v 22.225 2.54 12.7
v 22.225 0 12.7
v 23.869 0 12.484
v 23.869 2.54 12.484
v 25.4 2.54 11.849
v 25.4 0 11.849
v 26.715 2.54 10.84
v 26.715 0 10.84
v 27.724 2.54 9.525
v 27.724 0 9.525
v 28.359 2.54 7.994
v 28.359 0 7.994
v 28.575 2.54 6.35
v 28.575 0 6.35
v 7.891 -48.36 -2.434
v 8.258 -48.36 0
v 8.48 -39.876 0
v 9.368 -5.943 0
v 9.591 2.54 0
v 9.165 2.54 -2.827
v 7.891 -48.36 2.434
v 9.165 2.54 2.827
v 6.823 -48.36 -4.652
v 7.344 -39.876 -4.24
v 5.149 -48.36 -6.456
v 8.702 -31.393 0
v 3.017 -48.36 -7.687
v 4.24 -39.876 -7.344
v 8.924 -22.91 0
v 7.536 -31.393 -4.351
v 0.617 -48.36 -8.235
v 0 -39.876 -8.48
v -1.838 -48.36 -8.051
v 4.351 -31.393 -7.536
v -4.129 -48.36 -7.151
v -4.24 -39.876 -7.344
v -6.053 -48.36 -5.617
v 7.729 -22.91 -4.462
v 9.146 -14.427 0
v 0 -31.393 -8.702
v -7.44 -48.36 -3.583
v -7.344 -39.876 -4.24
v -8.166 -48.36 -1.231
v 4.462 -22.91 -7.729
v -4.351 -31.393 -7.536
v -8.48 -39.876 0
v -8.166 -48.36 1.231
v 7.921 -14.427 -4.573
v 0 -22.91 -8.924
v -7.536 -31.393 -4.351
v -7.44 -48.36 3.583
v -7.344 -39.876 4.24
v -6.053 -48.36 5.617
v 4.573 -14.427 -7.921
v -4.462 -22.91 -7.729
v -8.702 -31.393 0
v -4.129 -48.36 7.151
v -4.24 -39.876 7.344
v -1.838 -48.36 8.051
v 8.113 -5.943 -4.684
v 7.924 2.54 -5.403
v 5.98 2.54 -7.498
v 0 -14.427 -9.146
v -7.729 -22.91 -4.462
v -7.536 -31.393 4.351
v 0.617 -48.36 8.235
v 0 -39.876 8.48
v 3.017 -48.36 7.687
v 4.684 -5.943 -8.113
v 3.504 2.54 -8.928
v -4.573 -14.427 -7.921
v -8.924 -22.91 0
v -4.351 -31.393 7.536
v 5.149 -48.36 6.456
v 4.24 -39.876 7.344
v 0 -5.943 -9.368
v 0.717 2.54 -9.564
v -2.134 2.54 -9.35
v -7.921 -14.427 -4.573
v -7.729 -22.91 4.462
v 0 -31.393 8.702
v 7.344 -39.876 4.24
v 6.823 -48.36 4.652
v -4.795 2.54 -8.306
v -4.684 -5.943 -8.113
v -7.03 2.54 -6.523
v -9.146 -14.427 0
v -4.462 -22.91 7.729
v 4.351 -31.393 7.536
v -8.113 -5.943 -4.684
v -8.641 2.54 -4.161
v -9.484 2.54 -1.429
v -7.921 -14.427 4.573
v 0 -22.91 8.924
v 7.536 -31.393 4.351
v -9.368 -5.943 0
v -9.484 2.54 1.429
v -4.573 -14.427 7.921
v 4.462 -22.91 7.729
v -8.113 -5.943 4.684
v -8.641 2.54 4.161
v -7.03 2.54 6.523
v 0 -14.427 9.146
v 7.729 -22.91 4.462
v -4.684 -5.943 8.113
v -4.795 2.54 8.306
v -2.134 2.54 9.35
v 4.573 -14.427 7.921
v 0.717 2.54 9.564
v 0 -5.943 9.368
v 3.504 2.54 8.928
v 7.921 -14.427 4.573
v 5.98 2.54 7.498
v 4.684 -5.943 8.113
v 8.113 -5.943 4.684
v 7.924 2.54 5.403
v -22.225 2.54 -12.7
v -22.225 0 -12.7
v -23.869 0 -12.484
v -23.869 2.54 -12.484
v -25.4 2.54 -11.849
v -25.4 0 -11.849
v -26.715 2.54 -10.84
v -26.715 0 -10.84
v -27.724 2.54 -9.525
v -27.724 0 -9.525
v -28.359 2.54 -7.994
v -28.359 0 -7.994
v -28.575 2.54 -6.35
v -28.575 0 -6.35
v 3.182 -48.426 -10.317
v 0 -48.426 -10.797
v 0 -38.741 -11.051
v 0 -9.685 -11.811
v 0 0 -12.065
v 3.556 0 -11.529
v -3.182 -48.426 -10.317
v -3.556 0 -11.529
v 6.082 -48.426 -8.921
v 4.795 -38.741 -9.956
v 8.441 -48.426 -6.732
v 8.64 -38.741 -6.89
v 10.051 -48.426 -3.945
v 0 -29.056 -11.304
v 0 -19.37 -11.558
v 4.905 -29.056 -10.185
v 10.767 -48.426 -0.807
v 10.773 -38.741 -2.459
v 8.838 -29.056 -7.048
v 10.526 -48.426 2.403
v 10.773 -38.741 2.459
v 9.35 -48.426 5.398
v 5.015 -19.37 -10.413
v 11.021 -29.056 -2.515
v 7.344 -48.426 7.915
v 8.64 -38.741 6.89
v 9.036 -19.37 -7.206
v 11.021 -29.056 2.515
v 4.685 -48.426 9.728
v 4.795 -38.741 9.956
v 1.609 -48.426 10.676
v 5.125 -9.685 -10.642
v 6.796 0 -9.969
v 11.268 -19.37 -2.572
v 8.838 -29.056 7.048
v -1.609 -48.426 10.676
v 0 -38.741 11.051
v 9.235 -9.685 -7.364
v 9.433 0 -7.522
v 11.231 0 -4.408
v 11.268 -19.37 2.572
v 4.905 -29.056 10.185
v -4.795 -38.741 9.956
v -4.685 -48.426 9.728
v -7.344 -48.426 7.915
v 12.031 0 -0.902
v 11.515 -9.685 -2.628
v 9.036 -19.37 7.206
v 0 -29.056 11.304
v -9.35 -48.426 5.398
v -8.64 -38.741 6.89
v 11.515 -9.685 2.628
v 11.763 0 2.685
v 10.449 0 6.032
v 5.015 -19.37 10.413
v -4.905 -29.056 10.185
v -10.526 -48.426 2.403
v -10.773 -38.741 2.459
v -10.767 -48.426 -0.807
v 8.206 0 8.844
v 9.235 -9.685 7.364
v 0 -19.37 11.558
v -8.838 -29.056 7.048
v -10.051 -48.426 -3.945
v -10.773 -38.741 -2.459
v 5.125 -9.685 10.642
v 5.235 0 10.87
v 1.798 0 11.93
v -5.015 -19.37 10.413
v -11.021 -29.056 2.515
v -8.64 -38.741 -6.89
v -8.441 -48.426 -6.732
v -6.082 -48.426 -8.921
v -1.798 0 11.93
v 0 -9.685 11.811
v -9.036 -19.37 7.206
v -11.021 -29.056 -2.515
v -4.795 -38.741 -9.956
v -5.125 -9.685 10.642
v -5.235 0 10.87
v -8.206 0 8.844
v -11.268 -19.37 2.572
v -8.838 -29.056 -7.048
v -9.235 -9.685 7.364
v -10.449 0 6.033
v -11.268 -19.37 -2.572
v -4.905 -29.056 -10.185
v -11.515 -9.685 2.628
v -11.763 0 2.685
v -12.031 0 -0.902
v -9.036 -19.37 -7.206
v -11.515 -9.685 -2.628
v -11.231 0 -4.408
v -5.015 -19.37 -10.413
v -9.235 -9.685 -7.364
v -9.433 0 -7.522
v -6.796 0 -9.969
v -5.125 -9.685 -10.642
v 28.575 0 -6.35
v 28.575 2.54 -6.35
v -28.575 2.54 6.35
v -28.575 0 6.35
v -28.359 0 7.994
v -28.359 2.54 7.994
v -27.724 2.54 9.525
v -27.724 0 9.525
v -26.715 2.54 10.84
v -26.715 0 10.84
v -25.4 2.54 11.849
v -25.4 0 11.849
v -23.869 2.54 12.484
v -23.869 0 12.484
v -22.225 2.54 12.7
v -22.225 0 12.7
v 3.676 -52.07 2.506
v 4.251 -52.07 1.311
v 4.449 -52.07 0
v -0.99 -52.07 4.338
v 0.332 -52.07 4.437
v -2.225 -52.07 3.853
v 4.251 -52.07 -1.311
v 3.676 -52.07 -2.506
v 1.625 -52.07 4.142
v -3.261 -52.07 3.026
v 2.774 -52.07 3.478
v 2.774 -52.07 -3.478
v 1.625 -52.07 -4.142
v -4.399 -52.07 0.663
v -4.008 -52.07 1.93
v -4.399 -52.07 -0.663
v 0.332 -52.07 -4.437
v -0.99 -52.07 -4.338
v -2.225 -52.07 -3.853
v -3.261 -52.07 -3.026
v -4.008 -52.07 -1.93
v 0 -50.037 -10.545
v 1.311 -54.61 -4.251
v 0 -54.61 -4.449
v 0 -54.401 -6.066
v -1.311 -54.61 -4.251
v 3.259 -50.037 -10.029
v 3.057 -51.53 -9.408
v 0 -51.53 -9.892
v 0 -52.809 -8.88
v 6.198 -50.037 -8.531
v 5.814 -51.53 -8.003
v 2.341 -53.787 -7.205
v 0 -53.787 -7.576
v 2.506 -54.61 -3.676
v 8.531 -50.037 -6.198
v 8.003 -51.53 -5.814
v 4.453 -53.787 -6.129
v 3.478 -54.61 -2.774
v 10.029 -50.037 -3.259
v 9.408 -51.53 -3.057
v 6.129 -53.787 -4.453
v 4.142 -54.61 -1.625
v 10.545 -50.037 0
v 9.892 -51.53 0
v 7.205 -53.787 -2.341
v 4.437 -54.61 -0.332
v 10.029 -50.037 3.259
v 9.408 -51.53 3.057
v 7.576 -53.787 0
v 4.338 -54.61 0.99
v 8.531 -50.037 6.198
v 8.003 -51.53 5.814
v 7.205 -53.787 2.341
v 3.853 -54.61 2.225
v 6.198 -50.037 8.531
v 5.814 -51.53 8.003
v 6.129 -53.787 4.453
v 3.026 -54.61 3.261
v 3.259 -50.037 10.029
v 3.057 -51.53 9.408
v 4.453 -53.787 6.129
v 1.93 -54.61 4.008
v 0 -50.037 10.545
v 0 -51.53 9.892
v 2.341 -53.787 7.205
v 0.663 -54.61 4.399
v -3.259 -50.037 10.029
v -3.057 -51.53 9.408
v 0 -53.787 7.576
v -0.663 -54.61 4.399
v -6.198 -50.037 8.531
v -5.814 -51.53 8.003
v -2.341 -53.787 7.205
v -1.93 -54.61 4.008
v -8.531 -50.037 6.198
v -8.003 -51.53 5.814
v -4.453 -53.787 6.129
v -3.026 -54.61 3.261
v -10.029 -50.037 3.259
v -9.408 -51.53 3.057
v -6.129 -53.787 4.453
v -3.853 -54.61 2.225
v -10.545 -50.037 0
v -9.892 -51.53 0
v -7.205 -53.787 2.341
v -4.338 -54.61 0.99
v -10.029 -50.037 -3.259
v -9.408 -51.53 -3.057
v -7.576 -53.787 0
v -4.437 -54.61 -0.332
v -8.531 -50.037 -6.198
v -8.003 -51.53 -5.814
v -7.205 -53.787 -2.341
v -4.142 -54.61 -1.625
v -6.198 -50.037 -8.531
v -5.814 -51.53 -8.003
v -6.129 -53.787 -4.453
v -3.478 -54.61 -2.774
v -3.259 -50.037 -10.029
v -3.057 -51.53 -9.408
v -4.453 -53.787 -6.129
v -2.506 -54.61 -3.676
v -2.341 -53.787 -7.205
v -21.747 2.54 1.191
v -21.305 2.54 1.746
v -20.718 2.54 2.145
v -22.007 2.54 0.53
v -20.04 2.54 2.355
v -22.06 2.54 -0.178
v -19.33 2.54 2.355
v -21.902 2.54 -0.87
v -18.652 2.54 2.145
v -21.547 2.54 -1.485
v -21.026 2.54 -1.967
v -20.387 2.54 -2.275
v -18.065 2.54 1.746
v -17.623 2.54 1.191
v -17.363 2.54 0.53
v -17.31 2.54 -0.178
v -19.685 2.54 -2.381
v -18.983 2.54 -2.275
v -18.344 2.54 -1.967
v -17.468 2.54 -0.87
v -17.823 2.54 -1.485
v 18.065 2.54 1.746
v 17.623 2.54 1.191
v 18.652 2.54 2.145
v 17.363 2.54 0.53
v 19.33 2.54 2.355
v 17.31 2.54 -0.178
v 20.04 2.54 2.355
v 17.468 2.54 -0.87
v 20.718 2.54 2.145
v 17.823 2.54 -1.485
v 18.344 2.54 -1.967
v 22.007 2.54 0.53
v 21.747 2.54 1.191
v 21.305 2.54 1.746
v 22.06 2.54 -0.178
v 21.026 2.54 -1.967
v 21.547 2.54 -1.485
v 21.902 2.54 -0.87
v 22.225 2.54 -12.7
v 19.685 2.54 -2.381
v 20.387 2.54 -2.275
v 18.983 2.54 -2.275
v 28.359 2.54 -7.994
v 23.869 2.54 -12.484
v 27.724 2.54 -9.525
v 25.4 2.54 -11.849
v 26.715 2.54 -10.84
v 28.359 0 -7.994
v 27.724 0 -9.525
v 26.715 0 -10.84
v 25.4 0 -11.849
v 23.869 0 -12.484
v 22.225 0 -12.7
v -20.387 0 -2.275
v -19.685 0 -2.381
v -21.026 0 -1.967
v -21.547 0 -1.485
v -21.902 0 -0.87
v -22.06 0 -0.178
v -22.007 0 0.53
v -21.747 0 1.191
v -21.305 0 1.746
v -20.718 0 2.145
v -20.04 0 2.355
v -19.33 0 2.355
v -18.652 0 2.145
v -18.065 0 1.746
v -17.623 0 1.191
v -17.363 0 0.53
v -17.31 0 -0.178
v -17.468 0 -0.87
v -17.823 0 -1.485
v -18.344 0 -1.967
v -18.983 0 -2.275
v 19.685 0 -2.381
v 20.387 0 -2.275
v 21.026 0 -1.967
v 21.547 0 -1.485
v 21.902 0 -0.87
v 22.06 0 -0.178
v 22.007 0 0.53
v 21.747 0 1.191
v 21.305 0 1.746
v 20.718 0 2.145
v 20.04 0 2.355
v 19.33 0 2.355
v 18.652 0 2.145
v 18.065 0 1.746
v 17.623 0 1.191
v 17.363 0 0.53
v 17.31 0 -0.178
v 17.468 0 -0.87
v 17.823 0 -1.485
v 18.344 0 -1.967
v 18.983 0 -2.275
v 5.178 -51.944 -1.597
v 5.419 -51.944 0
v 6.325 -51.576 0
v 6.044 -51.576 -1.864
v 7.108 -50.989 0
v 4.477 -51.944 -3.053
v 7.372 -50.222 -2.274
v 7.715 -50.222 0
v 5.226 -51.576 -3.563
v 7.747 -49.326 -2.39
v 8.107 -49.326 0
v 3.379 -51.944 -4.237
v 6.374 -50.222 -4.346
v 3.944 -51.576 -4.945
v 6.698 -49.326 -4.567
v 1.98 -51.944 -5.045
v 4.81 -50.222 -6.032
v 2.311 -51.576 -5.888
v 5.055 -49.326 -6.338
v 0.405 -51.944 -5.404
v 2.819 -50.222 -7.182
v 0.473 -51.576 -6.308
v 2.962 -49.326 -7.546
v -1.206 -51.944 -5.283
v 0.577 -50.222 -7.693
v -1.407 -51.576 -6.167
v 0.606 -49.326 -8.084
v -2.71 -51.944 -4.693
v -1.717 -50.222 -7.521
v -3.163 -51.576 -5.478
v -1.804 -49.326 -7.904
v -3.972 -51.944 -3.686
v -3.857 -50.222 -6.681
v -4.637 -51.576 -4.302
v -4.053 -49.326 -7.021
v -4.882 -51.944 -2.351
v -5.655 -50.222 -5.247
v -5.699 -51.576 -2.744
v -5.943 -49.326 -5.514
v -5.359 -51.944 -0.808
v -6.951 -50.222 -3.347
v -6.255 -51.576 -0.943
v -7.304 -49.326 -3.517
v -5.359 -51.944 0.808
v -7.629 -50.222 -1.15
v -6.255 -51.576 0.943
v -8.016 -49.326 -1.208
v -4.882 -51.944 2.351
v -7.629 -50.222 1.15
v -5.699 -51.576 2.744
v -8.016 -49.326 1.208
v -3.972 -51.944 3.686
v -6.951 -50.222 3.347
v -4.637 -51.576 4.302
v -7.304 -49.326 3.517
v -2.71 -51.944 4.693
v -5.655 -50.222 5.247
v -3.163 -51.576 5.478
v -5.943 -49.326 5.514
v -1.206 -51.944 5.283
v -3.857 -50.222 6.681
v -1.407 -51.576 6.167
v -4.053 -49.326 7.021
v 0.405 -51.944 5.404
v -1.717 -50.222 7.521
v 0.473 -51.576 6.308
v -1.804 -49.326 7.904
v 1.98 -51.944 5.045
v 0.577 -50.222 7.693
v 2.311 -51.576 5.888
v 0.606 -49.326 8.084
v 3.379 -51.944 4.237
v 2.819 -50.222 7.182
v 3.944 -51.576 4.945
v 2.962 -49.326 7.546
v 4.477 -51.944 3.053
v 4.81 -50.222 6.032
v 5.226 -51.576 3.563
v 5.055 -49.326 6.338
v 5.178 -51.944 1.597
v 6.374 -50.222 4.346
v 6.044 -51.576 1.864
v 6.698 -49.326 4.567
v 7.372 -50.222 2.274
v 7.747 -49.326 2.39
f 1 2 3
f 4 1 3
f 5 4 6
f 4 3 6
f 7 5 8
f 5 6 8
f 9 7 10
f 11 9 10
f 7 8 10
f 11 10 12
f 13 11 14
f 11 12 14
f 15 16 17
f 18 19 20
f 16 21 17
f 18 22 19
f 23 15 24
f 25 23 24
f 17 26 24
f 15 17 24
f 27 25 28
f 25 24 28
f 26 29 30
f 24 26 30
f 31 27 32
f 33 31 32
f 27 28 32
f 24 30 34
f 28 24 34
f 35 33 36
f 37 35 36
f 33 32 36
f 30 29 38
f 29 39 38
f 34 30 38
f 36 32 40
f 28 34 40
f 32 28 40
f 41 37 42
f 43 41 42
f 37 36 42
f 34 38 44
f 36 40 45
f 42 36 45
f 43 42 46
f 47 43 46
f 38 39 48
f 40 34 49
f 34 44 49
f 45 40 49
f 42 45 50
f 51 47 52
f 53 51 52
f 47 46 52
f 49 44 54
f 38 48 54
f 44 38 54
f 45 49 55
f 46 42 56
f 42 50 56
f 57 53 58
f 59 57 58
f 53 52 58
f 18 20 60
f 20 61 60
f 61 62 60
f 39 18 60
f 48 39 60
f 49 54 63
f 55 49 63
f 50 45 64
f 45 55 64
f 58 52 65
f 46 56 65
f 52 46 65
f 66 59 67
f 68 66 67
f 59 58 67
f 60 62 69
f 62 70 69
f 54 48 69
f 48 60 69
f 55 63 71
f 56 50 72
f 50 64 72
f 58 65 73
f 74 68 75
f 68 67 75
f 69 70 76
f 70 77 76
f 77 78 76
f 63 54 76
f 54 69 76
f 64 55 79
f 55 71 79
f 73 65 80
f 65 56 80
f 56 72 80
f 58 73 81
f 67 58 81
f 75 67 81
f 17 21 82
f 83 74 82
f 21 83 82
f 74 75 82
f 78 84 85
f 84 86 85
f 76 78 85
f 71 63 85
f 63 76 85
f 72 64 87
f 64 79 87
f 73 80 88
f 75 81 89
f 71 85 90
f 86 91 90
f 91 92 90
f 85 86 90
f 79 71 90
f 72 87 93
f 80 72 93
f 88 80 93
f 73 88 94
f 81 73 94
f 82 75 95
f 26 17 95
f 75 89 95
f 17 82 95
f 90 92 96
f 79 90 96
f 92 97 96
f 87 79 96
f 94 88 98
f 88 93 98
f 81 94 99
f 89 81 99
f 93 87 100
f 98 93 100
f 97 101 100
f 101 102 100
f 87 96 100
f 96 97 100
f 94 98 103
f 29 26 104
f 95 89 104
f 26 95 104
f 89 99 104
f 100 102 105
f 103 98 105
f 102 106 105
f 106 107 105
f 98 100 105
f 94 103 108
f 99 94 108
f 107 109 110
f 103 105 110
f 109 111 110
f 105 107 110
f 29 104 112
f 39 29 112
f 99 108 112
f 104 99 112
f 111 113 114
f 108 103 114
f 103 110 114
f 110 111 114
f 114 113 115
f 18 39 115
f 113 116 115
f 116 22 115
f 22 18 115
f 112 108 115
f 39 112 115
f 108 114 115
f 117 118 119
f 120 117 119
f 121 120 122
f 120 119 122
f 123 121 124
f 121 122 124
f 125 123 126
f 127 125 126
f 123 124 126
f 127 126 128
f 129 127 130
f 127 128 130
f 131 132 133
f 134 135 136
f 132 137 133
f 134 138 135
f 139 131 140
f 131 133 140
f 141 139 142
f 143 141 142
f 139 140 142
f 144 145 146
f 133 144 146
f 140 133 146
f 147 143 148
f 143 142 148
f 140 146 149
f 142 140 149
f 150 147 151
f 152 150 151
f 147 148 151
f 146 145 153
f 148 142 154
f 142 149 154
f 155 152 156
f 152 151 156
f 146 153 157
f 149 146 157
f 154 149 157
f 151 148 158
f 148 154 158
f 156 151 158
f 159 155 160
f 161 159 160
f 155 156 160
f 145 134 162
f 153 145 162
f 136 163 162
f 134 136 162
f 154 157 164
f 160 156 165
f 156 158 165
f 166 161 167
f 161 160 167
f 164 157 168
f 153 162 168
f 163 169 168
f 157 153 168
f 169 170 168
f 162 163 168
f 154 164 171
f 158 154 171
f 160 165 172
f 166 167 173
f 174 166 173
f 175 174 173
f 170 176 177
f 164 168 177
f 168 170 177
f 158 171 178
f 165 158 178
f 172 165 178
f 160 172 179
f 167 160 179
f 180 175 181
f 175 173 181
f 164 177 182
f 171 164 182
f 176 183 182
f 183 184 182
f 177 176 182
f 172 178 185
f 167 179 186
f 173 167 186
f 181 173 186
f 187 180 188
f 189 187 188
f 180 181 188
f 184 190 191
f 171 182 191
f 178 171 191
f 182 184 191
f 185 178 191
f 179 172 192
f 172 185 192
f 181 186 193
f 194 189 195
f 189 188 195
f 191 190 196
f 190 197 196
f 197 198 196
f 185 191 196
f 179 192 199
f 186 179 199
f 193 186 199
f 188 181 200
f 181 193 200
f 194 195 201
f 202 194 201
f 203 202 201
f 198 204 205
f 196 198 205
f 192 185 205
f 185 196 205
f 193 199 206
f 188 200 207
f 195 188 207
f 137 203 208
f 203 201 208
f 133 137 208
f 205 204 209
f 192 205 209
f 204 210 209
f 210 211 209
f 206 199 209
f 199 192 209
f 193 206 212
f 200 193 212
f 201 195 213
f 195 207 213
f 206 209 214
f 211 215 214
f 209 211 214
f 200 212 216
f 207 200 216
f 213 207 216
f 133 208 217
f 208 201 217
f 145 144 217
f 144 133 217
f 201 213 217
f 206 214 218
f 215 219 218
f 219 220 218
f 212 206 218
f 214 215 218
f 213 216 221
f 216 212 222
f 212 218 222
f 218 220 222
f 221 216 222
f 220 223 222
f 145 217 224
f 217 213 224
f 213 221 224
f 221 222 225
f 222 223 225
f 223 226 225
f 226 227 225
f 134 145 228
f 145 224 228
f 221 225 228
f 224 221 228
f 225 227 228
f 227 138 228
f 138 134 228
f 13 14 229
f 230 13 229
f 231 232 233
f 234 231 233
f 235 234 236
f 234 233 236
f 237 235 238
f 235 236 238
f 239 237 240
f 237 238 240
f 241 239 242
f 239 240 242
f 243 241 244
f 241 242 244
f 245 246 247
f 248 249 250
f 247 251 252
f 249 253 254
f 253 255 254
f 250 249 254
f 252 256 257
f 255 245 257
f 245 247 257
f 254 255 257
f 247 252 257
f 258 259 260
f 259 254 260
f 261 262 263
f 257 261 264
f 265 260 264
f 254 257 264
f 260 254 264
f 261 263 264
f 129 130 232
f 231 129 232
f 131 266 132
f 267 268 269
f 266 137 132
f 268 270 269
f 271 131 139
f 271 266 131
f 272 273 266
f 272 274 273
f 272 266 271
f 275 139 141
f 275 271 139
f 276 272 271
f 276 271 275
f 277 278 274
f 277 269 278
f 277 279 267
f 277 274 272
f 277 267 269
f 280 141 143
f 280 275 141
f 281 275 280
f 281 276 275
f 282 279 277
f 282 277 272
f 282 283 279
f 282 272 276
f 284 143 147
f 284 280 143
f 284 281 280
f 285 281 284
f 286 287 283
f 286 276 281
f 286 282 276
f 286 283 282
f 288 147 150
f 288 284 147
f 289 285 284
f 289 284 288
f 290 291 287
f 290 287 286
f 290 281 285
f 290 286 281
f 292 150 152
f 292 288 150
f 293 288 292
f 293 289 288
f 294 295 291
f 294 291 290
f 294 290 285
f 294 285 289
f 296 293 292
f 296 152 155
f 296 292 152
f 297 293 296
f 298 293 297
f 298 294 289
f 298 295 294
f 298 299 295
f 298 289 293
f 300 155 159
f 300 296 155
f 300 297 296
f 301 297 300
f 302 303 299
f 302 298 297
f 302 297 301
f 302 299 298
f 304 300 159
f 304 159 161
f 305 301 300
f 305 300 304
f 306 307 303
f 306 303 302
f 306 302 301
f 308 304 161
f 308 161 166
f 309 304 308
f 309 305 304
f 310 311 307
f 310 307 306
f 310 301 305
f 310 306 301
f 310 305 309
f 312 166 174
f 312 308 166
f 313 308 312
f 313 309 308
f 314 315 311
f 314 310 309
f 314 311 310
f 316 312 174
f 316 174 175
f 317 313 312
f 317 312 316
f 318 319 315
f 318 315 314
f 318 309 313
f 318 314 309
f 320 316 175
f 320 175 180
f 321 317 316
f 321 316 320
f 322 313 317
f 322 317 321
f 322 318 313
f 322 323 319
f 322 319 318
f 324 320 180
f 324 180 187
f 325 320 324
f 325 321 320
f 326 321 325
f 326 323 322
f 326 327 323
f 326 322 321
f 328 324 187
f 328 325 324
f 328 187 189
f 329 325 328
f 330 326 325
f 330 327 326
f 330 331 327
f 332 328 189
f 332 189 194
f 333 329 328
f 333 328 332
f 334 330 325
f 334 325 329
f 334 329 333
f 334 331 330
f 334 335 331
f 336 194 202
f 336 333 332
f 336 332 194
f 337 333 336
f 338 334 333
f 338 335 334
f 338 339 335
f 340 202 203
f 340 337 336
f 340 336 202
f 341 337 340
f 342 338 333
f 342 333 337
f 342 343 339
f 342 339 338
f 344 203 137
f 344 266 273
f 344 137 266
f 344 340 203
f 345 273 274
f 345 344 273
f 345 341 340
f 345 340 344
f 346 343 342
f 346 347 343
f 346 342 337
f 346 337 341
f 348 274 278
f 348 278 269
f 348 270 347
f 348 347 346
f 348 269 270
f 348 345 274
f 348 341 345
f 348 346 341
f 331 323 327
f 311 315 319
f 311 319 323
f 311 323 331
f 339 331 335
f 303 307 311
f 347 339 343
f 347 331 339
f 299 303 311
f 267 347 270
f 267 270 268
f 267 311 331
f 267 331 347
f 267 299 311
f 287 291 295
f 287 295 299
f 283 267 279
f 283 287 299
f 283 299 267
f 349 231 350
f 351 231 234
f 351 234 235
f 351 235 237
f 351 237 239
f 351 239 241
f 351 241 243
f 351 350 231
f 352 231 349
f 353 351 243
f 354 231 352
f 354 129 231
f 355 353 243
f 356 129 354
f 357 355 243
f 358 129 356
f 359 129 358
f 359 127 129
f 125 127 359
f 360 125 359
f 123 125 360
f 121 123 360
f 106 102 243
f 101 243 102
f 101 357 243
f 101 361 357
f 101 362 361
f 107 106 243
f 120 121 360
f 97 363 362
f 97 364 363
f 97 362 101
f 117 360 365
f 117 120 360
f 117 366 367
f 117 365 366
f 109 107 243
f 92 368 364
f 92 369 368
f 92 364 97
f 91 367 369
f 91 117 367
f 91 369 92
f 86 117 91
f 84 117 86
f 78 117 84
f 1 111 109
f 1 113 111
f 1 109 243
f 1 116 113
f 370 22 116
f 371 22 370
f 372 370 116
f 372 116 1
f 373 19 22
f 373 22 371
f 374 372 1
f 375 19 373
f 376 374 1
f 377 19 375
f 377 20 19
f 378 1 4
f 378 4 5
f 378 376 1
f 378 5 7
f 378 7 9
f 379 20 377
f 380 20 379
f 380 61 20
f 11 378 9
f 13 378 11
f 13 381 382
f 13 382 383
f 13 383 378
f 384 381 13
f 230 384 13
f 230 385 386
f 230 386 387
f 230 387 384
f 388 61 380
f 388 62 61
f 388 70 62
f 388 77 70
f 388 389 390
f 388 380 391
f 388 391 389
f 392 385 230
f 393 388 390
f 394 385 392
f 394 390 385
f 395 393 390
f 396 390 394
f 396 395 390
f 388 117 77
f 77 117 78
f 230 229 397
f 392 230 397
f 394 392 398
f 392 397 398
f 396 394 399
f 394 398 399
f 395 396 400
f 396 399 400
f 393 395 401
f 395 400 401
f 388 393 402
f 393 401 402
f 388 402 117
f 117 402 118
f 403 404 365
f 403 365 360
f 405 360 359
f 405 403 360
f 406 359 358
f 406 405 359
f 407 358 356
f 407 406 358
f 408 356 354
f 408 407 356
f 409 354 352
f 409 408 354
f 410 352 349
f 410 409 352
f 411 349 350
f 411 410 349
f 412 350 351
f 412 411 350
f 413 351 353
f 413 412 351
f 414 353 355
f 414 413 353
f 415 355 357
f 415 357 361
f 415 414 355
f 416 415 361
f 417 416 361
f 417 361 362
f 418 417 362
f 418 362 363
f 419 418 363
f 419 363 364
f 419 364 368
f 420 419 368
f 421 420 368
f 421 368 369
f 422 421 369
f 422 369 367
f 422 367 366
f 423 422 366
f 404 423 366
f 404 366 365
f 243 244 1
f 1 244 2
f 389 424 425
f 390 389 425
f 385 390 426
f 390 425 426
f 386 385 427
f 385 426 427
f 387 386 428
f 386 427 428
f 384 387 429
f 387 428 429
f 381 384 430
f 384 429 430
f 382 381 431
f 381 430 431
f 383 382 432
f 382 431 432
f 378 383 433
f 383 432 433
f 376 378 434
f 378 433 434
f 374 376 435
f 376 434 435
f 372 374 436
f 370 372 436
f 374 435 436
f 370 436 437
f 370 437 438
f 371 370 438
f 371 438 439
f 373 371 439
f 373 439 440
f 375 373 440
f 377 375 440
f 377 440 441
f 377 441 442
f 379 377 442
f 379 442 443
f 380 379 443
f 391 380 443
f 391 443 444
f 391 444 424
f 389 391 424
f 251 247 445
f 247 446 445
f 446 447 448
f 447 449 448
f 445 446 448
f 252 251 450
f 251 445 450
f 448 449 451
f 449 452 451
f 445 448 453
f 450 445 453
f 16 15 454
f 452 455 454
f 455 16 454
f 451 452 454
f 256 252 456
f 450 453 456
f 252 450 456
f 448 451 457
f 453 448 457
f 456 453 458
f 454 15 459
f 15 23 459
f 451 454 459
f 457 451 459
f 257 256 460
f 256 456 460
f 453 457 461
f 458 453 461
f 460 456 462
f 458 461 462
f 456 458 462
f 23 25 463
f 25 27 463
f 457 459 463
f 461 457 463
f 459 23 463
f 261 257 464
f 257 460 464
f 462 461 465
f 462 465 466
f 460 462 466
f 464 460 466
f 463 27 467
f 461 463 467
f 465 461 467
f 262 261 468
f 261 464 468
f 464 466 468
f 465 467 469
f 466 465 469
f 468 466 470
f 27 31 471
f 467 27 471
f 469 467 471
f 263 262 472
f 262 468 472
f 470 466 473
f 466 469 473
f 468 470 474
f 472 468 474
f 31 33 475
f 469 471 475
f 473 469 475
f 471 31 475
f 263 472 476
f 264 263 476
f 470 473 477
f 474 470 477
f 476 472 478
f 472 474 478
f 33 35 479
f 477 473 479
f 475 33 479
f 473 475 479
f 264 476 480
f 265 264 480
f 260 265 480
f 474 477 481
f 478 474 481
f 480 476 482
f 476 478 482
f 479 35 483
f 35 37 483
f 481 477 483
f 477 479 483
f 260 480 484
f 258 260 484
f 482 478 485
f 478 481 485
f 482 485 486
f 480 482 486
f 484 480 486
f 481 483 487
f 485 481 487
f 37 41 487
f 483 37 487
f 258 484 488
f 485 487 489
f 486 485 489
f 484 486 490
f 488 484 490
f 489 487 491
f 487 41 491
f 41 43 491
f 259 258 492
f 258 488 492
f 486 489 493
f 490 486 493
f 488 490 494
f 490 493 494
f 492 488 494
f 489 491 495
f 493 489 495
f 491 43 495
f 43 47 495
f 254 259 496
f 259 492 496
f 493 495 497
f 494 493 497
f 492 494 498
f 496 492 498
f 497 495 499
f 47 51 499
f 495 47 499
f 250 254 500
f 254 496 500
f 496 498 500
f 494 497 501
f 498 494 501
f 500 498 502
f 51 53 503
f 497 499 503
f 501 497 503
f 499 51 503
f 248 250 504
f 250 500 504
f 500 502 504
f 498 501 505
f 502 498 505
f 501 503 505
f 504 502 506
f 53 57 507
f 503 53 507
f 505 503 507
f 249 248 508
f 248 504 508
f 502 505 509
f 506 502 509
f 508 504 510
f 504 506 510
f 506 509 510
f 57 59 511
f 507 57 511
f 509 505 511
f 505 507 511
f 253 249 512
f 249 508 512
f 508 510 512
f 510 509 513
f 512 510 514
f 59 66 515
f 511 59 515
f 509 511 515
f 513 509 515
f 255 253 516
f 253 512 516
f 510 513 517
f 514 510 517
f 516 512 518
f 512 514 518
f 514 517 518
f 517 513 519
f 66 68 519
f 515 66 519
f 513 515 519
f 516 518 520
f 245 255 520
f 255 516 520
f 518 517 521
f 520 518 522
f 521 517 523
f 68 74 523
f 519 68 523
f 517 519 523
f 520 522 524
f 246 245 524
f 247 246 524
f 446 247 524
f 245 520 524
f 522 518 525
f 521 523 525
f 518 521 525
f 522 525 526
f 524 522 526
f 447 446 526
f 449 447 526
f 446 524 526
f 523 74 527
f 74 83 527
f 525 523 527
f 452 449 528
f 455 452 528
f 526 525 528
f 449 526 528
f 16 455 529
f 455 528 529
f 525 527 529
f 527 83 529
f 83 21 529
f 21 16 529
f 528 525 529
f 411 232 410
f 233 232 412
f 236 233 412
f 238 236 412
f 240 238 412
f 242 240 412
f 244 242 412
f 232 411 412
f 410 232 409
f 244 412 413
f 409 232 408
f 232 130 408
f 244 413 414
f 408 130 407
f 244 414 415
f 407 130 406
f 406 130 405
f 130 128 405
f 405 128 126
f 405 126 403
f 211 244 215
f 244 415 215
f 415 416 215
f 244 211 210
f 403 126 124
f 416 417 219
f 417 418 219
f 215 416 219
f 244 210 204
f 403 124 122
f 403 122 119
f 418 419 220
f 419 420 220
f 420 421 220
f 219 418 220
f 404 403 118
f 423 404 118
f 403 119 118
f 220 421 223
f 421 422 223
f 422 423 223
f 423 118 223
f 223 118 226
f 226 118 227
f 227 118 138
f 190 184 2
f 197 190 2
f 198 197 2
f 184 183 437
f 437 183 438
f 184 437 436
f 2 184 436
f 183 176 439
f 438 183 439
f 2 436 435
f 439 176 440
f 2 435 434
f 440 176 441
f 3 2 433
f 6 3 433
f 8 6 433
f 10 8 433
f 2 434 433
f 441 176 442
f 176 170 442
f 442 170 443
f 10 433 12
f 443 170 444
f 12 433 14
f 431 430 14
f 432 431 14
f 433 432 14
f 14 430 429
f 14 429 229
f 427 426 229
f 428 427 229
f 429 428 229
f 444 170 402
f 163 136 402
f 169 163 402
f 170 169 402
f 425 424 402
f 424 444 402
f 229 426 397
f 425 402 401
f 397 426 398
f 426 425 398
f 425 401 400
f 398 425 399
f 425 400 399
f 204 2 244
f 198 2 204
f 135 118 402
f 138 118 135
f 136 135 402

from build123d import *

# Parameters (mm, degrees)
BOSS_EXTRUDE1_DEPTH = 2.54
SKETCH2_R           = 12.065
BOSS_EXTRUDE2_DEPTH = 54.61
DRAFT2_ANGLE        = 1.5
FILLET2_R           = 6.35
CUT_EXTRUDE1_REACH  = 64.929
SKETCH3_R           = 2.38125


# Read off the part's stored shape, not the designer's step: Shell1
with BuildPart() as part:
    # Sketch1 → Boss-Extrude1 (new body)
    with BuildSketch(Plane(origin=(0, 0, 0), x_dir=(1, 0, 0), z_dir=(0, 1, 0))):
        with BuildLine():
            Line((-22.225, -12.7), (22.225, -12.7))
            ThreePointArc((22.225, -12.7), (26.715128061, -10.840128061), (28.575, -6.35))
            Line((28.575, -6.35), (28.575, 6.35))
            ThreePointArc((28.575, 6.35), (26.715128061, 10.840128061), (22.225, 12.7))
            Line((22.225, 12.7), (-22.225, 12.7))
            ThreePointArc((-22.225, 12.7), (-26.715128061, 10.840128061), (-28.575, 6.35))
            Line((-28.575, 6.35), (-28.575, -6.35))
            ThreePointArc((-28.575, -6.35), (-26.715128061, -10.840128061), (-22.225, -12.7))
        make_face()
    extrude(amount=BOSS_EXTRUDE1_DEPTH)

    # Sketch2 → Boss-Extrude2 (add)
    with BuildSketch(Plane.XZ):
        with Locations(Location((0, 0, 0), (0, 0, 270))):
            Circle(SKETCH2_R)
    extrude(amount=BOSS_EXTRUDE2_DEPTH)

    # Draft2
    draft2_faces = [part.faces().sort_by_distance(p)[0] for p in [
        (0, -27.305, 12.065),
    ]]
    draft(draft2_faces, Plane(origin=(22.225, 0, 6.35), x_dir=(0, 0, -1), z_dir=(0, -1, 0)), DRAFT2_ANGLE)

    # Fillet2
    fillet2_edges = [part.edges().sort_by_distance(p)[0] for p in [
        (0, -54.61, 10.634986823),
    ]]
    fillet(fillet2_edges, radius=FILLET2_R)

    # Shell1 outline → Shell1 (revolve, cut)
    with BuildSketch(Plane.XY):
        with BuildLine():
            ThreePointArc((4.449090693, -52.07), (7.107672345, -50.989110404), (8.257785101, -48.359734173))
            Line((8.257785101, -48.359734173), (9.590641548, 2.54))
            Line((9.590641548, 2.54), (0, 2.54))
            Line((0, 2.54), (0, -52.07))
            Line((0, -52.07), (4.449090693, -52.07))
        make_face()
    revolve(axis=Axis((0, 0, 0), (0, 1, 0)), mode=Mode.SUBTRACT)

    # Sketch3 → Cut-Extrude1 (cut, up to next)
    with BuildSketch(Plane.XZ, mode=Mode.PRIVATE) as cut_extrude1_sk1:
        with Locations(Location((19.685, 0, 0), (0, 0, 270))):
            Circle(SKETCH3_R)
    cut_extrude1_tool1 = extrude(cut_extrude1_sk1.sketch, amount=-CUT_EXTRUDE1_REACH, mode=Mode.PRIVATE) & part.part
    cut_extrude1 = cut_extrude1_tool1.solids().sort_by_distance((19.685, 0, 0))[0]
    add(cut_extrude1, mode=Mode.SUBTRACT)

    # Mirror1: Cut-Extrude1 across plane
    add(cut_extrude1.mirror(Plane(origin=(0, 0, 0), x_dir=(0, 0, 1), z_dir=(1, 0, 0))), mode=Mode.SUBTRACT)


solid = part.part
